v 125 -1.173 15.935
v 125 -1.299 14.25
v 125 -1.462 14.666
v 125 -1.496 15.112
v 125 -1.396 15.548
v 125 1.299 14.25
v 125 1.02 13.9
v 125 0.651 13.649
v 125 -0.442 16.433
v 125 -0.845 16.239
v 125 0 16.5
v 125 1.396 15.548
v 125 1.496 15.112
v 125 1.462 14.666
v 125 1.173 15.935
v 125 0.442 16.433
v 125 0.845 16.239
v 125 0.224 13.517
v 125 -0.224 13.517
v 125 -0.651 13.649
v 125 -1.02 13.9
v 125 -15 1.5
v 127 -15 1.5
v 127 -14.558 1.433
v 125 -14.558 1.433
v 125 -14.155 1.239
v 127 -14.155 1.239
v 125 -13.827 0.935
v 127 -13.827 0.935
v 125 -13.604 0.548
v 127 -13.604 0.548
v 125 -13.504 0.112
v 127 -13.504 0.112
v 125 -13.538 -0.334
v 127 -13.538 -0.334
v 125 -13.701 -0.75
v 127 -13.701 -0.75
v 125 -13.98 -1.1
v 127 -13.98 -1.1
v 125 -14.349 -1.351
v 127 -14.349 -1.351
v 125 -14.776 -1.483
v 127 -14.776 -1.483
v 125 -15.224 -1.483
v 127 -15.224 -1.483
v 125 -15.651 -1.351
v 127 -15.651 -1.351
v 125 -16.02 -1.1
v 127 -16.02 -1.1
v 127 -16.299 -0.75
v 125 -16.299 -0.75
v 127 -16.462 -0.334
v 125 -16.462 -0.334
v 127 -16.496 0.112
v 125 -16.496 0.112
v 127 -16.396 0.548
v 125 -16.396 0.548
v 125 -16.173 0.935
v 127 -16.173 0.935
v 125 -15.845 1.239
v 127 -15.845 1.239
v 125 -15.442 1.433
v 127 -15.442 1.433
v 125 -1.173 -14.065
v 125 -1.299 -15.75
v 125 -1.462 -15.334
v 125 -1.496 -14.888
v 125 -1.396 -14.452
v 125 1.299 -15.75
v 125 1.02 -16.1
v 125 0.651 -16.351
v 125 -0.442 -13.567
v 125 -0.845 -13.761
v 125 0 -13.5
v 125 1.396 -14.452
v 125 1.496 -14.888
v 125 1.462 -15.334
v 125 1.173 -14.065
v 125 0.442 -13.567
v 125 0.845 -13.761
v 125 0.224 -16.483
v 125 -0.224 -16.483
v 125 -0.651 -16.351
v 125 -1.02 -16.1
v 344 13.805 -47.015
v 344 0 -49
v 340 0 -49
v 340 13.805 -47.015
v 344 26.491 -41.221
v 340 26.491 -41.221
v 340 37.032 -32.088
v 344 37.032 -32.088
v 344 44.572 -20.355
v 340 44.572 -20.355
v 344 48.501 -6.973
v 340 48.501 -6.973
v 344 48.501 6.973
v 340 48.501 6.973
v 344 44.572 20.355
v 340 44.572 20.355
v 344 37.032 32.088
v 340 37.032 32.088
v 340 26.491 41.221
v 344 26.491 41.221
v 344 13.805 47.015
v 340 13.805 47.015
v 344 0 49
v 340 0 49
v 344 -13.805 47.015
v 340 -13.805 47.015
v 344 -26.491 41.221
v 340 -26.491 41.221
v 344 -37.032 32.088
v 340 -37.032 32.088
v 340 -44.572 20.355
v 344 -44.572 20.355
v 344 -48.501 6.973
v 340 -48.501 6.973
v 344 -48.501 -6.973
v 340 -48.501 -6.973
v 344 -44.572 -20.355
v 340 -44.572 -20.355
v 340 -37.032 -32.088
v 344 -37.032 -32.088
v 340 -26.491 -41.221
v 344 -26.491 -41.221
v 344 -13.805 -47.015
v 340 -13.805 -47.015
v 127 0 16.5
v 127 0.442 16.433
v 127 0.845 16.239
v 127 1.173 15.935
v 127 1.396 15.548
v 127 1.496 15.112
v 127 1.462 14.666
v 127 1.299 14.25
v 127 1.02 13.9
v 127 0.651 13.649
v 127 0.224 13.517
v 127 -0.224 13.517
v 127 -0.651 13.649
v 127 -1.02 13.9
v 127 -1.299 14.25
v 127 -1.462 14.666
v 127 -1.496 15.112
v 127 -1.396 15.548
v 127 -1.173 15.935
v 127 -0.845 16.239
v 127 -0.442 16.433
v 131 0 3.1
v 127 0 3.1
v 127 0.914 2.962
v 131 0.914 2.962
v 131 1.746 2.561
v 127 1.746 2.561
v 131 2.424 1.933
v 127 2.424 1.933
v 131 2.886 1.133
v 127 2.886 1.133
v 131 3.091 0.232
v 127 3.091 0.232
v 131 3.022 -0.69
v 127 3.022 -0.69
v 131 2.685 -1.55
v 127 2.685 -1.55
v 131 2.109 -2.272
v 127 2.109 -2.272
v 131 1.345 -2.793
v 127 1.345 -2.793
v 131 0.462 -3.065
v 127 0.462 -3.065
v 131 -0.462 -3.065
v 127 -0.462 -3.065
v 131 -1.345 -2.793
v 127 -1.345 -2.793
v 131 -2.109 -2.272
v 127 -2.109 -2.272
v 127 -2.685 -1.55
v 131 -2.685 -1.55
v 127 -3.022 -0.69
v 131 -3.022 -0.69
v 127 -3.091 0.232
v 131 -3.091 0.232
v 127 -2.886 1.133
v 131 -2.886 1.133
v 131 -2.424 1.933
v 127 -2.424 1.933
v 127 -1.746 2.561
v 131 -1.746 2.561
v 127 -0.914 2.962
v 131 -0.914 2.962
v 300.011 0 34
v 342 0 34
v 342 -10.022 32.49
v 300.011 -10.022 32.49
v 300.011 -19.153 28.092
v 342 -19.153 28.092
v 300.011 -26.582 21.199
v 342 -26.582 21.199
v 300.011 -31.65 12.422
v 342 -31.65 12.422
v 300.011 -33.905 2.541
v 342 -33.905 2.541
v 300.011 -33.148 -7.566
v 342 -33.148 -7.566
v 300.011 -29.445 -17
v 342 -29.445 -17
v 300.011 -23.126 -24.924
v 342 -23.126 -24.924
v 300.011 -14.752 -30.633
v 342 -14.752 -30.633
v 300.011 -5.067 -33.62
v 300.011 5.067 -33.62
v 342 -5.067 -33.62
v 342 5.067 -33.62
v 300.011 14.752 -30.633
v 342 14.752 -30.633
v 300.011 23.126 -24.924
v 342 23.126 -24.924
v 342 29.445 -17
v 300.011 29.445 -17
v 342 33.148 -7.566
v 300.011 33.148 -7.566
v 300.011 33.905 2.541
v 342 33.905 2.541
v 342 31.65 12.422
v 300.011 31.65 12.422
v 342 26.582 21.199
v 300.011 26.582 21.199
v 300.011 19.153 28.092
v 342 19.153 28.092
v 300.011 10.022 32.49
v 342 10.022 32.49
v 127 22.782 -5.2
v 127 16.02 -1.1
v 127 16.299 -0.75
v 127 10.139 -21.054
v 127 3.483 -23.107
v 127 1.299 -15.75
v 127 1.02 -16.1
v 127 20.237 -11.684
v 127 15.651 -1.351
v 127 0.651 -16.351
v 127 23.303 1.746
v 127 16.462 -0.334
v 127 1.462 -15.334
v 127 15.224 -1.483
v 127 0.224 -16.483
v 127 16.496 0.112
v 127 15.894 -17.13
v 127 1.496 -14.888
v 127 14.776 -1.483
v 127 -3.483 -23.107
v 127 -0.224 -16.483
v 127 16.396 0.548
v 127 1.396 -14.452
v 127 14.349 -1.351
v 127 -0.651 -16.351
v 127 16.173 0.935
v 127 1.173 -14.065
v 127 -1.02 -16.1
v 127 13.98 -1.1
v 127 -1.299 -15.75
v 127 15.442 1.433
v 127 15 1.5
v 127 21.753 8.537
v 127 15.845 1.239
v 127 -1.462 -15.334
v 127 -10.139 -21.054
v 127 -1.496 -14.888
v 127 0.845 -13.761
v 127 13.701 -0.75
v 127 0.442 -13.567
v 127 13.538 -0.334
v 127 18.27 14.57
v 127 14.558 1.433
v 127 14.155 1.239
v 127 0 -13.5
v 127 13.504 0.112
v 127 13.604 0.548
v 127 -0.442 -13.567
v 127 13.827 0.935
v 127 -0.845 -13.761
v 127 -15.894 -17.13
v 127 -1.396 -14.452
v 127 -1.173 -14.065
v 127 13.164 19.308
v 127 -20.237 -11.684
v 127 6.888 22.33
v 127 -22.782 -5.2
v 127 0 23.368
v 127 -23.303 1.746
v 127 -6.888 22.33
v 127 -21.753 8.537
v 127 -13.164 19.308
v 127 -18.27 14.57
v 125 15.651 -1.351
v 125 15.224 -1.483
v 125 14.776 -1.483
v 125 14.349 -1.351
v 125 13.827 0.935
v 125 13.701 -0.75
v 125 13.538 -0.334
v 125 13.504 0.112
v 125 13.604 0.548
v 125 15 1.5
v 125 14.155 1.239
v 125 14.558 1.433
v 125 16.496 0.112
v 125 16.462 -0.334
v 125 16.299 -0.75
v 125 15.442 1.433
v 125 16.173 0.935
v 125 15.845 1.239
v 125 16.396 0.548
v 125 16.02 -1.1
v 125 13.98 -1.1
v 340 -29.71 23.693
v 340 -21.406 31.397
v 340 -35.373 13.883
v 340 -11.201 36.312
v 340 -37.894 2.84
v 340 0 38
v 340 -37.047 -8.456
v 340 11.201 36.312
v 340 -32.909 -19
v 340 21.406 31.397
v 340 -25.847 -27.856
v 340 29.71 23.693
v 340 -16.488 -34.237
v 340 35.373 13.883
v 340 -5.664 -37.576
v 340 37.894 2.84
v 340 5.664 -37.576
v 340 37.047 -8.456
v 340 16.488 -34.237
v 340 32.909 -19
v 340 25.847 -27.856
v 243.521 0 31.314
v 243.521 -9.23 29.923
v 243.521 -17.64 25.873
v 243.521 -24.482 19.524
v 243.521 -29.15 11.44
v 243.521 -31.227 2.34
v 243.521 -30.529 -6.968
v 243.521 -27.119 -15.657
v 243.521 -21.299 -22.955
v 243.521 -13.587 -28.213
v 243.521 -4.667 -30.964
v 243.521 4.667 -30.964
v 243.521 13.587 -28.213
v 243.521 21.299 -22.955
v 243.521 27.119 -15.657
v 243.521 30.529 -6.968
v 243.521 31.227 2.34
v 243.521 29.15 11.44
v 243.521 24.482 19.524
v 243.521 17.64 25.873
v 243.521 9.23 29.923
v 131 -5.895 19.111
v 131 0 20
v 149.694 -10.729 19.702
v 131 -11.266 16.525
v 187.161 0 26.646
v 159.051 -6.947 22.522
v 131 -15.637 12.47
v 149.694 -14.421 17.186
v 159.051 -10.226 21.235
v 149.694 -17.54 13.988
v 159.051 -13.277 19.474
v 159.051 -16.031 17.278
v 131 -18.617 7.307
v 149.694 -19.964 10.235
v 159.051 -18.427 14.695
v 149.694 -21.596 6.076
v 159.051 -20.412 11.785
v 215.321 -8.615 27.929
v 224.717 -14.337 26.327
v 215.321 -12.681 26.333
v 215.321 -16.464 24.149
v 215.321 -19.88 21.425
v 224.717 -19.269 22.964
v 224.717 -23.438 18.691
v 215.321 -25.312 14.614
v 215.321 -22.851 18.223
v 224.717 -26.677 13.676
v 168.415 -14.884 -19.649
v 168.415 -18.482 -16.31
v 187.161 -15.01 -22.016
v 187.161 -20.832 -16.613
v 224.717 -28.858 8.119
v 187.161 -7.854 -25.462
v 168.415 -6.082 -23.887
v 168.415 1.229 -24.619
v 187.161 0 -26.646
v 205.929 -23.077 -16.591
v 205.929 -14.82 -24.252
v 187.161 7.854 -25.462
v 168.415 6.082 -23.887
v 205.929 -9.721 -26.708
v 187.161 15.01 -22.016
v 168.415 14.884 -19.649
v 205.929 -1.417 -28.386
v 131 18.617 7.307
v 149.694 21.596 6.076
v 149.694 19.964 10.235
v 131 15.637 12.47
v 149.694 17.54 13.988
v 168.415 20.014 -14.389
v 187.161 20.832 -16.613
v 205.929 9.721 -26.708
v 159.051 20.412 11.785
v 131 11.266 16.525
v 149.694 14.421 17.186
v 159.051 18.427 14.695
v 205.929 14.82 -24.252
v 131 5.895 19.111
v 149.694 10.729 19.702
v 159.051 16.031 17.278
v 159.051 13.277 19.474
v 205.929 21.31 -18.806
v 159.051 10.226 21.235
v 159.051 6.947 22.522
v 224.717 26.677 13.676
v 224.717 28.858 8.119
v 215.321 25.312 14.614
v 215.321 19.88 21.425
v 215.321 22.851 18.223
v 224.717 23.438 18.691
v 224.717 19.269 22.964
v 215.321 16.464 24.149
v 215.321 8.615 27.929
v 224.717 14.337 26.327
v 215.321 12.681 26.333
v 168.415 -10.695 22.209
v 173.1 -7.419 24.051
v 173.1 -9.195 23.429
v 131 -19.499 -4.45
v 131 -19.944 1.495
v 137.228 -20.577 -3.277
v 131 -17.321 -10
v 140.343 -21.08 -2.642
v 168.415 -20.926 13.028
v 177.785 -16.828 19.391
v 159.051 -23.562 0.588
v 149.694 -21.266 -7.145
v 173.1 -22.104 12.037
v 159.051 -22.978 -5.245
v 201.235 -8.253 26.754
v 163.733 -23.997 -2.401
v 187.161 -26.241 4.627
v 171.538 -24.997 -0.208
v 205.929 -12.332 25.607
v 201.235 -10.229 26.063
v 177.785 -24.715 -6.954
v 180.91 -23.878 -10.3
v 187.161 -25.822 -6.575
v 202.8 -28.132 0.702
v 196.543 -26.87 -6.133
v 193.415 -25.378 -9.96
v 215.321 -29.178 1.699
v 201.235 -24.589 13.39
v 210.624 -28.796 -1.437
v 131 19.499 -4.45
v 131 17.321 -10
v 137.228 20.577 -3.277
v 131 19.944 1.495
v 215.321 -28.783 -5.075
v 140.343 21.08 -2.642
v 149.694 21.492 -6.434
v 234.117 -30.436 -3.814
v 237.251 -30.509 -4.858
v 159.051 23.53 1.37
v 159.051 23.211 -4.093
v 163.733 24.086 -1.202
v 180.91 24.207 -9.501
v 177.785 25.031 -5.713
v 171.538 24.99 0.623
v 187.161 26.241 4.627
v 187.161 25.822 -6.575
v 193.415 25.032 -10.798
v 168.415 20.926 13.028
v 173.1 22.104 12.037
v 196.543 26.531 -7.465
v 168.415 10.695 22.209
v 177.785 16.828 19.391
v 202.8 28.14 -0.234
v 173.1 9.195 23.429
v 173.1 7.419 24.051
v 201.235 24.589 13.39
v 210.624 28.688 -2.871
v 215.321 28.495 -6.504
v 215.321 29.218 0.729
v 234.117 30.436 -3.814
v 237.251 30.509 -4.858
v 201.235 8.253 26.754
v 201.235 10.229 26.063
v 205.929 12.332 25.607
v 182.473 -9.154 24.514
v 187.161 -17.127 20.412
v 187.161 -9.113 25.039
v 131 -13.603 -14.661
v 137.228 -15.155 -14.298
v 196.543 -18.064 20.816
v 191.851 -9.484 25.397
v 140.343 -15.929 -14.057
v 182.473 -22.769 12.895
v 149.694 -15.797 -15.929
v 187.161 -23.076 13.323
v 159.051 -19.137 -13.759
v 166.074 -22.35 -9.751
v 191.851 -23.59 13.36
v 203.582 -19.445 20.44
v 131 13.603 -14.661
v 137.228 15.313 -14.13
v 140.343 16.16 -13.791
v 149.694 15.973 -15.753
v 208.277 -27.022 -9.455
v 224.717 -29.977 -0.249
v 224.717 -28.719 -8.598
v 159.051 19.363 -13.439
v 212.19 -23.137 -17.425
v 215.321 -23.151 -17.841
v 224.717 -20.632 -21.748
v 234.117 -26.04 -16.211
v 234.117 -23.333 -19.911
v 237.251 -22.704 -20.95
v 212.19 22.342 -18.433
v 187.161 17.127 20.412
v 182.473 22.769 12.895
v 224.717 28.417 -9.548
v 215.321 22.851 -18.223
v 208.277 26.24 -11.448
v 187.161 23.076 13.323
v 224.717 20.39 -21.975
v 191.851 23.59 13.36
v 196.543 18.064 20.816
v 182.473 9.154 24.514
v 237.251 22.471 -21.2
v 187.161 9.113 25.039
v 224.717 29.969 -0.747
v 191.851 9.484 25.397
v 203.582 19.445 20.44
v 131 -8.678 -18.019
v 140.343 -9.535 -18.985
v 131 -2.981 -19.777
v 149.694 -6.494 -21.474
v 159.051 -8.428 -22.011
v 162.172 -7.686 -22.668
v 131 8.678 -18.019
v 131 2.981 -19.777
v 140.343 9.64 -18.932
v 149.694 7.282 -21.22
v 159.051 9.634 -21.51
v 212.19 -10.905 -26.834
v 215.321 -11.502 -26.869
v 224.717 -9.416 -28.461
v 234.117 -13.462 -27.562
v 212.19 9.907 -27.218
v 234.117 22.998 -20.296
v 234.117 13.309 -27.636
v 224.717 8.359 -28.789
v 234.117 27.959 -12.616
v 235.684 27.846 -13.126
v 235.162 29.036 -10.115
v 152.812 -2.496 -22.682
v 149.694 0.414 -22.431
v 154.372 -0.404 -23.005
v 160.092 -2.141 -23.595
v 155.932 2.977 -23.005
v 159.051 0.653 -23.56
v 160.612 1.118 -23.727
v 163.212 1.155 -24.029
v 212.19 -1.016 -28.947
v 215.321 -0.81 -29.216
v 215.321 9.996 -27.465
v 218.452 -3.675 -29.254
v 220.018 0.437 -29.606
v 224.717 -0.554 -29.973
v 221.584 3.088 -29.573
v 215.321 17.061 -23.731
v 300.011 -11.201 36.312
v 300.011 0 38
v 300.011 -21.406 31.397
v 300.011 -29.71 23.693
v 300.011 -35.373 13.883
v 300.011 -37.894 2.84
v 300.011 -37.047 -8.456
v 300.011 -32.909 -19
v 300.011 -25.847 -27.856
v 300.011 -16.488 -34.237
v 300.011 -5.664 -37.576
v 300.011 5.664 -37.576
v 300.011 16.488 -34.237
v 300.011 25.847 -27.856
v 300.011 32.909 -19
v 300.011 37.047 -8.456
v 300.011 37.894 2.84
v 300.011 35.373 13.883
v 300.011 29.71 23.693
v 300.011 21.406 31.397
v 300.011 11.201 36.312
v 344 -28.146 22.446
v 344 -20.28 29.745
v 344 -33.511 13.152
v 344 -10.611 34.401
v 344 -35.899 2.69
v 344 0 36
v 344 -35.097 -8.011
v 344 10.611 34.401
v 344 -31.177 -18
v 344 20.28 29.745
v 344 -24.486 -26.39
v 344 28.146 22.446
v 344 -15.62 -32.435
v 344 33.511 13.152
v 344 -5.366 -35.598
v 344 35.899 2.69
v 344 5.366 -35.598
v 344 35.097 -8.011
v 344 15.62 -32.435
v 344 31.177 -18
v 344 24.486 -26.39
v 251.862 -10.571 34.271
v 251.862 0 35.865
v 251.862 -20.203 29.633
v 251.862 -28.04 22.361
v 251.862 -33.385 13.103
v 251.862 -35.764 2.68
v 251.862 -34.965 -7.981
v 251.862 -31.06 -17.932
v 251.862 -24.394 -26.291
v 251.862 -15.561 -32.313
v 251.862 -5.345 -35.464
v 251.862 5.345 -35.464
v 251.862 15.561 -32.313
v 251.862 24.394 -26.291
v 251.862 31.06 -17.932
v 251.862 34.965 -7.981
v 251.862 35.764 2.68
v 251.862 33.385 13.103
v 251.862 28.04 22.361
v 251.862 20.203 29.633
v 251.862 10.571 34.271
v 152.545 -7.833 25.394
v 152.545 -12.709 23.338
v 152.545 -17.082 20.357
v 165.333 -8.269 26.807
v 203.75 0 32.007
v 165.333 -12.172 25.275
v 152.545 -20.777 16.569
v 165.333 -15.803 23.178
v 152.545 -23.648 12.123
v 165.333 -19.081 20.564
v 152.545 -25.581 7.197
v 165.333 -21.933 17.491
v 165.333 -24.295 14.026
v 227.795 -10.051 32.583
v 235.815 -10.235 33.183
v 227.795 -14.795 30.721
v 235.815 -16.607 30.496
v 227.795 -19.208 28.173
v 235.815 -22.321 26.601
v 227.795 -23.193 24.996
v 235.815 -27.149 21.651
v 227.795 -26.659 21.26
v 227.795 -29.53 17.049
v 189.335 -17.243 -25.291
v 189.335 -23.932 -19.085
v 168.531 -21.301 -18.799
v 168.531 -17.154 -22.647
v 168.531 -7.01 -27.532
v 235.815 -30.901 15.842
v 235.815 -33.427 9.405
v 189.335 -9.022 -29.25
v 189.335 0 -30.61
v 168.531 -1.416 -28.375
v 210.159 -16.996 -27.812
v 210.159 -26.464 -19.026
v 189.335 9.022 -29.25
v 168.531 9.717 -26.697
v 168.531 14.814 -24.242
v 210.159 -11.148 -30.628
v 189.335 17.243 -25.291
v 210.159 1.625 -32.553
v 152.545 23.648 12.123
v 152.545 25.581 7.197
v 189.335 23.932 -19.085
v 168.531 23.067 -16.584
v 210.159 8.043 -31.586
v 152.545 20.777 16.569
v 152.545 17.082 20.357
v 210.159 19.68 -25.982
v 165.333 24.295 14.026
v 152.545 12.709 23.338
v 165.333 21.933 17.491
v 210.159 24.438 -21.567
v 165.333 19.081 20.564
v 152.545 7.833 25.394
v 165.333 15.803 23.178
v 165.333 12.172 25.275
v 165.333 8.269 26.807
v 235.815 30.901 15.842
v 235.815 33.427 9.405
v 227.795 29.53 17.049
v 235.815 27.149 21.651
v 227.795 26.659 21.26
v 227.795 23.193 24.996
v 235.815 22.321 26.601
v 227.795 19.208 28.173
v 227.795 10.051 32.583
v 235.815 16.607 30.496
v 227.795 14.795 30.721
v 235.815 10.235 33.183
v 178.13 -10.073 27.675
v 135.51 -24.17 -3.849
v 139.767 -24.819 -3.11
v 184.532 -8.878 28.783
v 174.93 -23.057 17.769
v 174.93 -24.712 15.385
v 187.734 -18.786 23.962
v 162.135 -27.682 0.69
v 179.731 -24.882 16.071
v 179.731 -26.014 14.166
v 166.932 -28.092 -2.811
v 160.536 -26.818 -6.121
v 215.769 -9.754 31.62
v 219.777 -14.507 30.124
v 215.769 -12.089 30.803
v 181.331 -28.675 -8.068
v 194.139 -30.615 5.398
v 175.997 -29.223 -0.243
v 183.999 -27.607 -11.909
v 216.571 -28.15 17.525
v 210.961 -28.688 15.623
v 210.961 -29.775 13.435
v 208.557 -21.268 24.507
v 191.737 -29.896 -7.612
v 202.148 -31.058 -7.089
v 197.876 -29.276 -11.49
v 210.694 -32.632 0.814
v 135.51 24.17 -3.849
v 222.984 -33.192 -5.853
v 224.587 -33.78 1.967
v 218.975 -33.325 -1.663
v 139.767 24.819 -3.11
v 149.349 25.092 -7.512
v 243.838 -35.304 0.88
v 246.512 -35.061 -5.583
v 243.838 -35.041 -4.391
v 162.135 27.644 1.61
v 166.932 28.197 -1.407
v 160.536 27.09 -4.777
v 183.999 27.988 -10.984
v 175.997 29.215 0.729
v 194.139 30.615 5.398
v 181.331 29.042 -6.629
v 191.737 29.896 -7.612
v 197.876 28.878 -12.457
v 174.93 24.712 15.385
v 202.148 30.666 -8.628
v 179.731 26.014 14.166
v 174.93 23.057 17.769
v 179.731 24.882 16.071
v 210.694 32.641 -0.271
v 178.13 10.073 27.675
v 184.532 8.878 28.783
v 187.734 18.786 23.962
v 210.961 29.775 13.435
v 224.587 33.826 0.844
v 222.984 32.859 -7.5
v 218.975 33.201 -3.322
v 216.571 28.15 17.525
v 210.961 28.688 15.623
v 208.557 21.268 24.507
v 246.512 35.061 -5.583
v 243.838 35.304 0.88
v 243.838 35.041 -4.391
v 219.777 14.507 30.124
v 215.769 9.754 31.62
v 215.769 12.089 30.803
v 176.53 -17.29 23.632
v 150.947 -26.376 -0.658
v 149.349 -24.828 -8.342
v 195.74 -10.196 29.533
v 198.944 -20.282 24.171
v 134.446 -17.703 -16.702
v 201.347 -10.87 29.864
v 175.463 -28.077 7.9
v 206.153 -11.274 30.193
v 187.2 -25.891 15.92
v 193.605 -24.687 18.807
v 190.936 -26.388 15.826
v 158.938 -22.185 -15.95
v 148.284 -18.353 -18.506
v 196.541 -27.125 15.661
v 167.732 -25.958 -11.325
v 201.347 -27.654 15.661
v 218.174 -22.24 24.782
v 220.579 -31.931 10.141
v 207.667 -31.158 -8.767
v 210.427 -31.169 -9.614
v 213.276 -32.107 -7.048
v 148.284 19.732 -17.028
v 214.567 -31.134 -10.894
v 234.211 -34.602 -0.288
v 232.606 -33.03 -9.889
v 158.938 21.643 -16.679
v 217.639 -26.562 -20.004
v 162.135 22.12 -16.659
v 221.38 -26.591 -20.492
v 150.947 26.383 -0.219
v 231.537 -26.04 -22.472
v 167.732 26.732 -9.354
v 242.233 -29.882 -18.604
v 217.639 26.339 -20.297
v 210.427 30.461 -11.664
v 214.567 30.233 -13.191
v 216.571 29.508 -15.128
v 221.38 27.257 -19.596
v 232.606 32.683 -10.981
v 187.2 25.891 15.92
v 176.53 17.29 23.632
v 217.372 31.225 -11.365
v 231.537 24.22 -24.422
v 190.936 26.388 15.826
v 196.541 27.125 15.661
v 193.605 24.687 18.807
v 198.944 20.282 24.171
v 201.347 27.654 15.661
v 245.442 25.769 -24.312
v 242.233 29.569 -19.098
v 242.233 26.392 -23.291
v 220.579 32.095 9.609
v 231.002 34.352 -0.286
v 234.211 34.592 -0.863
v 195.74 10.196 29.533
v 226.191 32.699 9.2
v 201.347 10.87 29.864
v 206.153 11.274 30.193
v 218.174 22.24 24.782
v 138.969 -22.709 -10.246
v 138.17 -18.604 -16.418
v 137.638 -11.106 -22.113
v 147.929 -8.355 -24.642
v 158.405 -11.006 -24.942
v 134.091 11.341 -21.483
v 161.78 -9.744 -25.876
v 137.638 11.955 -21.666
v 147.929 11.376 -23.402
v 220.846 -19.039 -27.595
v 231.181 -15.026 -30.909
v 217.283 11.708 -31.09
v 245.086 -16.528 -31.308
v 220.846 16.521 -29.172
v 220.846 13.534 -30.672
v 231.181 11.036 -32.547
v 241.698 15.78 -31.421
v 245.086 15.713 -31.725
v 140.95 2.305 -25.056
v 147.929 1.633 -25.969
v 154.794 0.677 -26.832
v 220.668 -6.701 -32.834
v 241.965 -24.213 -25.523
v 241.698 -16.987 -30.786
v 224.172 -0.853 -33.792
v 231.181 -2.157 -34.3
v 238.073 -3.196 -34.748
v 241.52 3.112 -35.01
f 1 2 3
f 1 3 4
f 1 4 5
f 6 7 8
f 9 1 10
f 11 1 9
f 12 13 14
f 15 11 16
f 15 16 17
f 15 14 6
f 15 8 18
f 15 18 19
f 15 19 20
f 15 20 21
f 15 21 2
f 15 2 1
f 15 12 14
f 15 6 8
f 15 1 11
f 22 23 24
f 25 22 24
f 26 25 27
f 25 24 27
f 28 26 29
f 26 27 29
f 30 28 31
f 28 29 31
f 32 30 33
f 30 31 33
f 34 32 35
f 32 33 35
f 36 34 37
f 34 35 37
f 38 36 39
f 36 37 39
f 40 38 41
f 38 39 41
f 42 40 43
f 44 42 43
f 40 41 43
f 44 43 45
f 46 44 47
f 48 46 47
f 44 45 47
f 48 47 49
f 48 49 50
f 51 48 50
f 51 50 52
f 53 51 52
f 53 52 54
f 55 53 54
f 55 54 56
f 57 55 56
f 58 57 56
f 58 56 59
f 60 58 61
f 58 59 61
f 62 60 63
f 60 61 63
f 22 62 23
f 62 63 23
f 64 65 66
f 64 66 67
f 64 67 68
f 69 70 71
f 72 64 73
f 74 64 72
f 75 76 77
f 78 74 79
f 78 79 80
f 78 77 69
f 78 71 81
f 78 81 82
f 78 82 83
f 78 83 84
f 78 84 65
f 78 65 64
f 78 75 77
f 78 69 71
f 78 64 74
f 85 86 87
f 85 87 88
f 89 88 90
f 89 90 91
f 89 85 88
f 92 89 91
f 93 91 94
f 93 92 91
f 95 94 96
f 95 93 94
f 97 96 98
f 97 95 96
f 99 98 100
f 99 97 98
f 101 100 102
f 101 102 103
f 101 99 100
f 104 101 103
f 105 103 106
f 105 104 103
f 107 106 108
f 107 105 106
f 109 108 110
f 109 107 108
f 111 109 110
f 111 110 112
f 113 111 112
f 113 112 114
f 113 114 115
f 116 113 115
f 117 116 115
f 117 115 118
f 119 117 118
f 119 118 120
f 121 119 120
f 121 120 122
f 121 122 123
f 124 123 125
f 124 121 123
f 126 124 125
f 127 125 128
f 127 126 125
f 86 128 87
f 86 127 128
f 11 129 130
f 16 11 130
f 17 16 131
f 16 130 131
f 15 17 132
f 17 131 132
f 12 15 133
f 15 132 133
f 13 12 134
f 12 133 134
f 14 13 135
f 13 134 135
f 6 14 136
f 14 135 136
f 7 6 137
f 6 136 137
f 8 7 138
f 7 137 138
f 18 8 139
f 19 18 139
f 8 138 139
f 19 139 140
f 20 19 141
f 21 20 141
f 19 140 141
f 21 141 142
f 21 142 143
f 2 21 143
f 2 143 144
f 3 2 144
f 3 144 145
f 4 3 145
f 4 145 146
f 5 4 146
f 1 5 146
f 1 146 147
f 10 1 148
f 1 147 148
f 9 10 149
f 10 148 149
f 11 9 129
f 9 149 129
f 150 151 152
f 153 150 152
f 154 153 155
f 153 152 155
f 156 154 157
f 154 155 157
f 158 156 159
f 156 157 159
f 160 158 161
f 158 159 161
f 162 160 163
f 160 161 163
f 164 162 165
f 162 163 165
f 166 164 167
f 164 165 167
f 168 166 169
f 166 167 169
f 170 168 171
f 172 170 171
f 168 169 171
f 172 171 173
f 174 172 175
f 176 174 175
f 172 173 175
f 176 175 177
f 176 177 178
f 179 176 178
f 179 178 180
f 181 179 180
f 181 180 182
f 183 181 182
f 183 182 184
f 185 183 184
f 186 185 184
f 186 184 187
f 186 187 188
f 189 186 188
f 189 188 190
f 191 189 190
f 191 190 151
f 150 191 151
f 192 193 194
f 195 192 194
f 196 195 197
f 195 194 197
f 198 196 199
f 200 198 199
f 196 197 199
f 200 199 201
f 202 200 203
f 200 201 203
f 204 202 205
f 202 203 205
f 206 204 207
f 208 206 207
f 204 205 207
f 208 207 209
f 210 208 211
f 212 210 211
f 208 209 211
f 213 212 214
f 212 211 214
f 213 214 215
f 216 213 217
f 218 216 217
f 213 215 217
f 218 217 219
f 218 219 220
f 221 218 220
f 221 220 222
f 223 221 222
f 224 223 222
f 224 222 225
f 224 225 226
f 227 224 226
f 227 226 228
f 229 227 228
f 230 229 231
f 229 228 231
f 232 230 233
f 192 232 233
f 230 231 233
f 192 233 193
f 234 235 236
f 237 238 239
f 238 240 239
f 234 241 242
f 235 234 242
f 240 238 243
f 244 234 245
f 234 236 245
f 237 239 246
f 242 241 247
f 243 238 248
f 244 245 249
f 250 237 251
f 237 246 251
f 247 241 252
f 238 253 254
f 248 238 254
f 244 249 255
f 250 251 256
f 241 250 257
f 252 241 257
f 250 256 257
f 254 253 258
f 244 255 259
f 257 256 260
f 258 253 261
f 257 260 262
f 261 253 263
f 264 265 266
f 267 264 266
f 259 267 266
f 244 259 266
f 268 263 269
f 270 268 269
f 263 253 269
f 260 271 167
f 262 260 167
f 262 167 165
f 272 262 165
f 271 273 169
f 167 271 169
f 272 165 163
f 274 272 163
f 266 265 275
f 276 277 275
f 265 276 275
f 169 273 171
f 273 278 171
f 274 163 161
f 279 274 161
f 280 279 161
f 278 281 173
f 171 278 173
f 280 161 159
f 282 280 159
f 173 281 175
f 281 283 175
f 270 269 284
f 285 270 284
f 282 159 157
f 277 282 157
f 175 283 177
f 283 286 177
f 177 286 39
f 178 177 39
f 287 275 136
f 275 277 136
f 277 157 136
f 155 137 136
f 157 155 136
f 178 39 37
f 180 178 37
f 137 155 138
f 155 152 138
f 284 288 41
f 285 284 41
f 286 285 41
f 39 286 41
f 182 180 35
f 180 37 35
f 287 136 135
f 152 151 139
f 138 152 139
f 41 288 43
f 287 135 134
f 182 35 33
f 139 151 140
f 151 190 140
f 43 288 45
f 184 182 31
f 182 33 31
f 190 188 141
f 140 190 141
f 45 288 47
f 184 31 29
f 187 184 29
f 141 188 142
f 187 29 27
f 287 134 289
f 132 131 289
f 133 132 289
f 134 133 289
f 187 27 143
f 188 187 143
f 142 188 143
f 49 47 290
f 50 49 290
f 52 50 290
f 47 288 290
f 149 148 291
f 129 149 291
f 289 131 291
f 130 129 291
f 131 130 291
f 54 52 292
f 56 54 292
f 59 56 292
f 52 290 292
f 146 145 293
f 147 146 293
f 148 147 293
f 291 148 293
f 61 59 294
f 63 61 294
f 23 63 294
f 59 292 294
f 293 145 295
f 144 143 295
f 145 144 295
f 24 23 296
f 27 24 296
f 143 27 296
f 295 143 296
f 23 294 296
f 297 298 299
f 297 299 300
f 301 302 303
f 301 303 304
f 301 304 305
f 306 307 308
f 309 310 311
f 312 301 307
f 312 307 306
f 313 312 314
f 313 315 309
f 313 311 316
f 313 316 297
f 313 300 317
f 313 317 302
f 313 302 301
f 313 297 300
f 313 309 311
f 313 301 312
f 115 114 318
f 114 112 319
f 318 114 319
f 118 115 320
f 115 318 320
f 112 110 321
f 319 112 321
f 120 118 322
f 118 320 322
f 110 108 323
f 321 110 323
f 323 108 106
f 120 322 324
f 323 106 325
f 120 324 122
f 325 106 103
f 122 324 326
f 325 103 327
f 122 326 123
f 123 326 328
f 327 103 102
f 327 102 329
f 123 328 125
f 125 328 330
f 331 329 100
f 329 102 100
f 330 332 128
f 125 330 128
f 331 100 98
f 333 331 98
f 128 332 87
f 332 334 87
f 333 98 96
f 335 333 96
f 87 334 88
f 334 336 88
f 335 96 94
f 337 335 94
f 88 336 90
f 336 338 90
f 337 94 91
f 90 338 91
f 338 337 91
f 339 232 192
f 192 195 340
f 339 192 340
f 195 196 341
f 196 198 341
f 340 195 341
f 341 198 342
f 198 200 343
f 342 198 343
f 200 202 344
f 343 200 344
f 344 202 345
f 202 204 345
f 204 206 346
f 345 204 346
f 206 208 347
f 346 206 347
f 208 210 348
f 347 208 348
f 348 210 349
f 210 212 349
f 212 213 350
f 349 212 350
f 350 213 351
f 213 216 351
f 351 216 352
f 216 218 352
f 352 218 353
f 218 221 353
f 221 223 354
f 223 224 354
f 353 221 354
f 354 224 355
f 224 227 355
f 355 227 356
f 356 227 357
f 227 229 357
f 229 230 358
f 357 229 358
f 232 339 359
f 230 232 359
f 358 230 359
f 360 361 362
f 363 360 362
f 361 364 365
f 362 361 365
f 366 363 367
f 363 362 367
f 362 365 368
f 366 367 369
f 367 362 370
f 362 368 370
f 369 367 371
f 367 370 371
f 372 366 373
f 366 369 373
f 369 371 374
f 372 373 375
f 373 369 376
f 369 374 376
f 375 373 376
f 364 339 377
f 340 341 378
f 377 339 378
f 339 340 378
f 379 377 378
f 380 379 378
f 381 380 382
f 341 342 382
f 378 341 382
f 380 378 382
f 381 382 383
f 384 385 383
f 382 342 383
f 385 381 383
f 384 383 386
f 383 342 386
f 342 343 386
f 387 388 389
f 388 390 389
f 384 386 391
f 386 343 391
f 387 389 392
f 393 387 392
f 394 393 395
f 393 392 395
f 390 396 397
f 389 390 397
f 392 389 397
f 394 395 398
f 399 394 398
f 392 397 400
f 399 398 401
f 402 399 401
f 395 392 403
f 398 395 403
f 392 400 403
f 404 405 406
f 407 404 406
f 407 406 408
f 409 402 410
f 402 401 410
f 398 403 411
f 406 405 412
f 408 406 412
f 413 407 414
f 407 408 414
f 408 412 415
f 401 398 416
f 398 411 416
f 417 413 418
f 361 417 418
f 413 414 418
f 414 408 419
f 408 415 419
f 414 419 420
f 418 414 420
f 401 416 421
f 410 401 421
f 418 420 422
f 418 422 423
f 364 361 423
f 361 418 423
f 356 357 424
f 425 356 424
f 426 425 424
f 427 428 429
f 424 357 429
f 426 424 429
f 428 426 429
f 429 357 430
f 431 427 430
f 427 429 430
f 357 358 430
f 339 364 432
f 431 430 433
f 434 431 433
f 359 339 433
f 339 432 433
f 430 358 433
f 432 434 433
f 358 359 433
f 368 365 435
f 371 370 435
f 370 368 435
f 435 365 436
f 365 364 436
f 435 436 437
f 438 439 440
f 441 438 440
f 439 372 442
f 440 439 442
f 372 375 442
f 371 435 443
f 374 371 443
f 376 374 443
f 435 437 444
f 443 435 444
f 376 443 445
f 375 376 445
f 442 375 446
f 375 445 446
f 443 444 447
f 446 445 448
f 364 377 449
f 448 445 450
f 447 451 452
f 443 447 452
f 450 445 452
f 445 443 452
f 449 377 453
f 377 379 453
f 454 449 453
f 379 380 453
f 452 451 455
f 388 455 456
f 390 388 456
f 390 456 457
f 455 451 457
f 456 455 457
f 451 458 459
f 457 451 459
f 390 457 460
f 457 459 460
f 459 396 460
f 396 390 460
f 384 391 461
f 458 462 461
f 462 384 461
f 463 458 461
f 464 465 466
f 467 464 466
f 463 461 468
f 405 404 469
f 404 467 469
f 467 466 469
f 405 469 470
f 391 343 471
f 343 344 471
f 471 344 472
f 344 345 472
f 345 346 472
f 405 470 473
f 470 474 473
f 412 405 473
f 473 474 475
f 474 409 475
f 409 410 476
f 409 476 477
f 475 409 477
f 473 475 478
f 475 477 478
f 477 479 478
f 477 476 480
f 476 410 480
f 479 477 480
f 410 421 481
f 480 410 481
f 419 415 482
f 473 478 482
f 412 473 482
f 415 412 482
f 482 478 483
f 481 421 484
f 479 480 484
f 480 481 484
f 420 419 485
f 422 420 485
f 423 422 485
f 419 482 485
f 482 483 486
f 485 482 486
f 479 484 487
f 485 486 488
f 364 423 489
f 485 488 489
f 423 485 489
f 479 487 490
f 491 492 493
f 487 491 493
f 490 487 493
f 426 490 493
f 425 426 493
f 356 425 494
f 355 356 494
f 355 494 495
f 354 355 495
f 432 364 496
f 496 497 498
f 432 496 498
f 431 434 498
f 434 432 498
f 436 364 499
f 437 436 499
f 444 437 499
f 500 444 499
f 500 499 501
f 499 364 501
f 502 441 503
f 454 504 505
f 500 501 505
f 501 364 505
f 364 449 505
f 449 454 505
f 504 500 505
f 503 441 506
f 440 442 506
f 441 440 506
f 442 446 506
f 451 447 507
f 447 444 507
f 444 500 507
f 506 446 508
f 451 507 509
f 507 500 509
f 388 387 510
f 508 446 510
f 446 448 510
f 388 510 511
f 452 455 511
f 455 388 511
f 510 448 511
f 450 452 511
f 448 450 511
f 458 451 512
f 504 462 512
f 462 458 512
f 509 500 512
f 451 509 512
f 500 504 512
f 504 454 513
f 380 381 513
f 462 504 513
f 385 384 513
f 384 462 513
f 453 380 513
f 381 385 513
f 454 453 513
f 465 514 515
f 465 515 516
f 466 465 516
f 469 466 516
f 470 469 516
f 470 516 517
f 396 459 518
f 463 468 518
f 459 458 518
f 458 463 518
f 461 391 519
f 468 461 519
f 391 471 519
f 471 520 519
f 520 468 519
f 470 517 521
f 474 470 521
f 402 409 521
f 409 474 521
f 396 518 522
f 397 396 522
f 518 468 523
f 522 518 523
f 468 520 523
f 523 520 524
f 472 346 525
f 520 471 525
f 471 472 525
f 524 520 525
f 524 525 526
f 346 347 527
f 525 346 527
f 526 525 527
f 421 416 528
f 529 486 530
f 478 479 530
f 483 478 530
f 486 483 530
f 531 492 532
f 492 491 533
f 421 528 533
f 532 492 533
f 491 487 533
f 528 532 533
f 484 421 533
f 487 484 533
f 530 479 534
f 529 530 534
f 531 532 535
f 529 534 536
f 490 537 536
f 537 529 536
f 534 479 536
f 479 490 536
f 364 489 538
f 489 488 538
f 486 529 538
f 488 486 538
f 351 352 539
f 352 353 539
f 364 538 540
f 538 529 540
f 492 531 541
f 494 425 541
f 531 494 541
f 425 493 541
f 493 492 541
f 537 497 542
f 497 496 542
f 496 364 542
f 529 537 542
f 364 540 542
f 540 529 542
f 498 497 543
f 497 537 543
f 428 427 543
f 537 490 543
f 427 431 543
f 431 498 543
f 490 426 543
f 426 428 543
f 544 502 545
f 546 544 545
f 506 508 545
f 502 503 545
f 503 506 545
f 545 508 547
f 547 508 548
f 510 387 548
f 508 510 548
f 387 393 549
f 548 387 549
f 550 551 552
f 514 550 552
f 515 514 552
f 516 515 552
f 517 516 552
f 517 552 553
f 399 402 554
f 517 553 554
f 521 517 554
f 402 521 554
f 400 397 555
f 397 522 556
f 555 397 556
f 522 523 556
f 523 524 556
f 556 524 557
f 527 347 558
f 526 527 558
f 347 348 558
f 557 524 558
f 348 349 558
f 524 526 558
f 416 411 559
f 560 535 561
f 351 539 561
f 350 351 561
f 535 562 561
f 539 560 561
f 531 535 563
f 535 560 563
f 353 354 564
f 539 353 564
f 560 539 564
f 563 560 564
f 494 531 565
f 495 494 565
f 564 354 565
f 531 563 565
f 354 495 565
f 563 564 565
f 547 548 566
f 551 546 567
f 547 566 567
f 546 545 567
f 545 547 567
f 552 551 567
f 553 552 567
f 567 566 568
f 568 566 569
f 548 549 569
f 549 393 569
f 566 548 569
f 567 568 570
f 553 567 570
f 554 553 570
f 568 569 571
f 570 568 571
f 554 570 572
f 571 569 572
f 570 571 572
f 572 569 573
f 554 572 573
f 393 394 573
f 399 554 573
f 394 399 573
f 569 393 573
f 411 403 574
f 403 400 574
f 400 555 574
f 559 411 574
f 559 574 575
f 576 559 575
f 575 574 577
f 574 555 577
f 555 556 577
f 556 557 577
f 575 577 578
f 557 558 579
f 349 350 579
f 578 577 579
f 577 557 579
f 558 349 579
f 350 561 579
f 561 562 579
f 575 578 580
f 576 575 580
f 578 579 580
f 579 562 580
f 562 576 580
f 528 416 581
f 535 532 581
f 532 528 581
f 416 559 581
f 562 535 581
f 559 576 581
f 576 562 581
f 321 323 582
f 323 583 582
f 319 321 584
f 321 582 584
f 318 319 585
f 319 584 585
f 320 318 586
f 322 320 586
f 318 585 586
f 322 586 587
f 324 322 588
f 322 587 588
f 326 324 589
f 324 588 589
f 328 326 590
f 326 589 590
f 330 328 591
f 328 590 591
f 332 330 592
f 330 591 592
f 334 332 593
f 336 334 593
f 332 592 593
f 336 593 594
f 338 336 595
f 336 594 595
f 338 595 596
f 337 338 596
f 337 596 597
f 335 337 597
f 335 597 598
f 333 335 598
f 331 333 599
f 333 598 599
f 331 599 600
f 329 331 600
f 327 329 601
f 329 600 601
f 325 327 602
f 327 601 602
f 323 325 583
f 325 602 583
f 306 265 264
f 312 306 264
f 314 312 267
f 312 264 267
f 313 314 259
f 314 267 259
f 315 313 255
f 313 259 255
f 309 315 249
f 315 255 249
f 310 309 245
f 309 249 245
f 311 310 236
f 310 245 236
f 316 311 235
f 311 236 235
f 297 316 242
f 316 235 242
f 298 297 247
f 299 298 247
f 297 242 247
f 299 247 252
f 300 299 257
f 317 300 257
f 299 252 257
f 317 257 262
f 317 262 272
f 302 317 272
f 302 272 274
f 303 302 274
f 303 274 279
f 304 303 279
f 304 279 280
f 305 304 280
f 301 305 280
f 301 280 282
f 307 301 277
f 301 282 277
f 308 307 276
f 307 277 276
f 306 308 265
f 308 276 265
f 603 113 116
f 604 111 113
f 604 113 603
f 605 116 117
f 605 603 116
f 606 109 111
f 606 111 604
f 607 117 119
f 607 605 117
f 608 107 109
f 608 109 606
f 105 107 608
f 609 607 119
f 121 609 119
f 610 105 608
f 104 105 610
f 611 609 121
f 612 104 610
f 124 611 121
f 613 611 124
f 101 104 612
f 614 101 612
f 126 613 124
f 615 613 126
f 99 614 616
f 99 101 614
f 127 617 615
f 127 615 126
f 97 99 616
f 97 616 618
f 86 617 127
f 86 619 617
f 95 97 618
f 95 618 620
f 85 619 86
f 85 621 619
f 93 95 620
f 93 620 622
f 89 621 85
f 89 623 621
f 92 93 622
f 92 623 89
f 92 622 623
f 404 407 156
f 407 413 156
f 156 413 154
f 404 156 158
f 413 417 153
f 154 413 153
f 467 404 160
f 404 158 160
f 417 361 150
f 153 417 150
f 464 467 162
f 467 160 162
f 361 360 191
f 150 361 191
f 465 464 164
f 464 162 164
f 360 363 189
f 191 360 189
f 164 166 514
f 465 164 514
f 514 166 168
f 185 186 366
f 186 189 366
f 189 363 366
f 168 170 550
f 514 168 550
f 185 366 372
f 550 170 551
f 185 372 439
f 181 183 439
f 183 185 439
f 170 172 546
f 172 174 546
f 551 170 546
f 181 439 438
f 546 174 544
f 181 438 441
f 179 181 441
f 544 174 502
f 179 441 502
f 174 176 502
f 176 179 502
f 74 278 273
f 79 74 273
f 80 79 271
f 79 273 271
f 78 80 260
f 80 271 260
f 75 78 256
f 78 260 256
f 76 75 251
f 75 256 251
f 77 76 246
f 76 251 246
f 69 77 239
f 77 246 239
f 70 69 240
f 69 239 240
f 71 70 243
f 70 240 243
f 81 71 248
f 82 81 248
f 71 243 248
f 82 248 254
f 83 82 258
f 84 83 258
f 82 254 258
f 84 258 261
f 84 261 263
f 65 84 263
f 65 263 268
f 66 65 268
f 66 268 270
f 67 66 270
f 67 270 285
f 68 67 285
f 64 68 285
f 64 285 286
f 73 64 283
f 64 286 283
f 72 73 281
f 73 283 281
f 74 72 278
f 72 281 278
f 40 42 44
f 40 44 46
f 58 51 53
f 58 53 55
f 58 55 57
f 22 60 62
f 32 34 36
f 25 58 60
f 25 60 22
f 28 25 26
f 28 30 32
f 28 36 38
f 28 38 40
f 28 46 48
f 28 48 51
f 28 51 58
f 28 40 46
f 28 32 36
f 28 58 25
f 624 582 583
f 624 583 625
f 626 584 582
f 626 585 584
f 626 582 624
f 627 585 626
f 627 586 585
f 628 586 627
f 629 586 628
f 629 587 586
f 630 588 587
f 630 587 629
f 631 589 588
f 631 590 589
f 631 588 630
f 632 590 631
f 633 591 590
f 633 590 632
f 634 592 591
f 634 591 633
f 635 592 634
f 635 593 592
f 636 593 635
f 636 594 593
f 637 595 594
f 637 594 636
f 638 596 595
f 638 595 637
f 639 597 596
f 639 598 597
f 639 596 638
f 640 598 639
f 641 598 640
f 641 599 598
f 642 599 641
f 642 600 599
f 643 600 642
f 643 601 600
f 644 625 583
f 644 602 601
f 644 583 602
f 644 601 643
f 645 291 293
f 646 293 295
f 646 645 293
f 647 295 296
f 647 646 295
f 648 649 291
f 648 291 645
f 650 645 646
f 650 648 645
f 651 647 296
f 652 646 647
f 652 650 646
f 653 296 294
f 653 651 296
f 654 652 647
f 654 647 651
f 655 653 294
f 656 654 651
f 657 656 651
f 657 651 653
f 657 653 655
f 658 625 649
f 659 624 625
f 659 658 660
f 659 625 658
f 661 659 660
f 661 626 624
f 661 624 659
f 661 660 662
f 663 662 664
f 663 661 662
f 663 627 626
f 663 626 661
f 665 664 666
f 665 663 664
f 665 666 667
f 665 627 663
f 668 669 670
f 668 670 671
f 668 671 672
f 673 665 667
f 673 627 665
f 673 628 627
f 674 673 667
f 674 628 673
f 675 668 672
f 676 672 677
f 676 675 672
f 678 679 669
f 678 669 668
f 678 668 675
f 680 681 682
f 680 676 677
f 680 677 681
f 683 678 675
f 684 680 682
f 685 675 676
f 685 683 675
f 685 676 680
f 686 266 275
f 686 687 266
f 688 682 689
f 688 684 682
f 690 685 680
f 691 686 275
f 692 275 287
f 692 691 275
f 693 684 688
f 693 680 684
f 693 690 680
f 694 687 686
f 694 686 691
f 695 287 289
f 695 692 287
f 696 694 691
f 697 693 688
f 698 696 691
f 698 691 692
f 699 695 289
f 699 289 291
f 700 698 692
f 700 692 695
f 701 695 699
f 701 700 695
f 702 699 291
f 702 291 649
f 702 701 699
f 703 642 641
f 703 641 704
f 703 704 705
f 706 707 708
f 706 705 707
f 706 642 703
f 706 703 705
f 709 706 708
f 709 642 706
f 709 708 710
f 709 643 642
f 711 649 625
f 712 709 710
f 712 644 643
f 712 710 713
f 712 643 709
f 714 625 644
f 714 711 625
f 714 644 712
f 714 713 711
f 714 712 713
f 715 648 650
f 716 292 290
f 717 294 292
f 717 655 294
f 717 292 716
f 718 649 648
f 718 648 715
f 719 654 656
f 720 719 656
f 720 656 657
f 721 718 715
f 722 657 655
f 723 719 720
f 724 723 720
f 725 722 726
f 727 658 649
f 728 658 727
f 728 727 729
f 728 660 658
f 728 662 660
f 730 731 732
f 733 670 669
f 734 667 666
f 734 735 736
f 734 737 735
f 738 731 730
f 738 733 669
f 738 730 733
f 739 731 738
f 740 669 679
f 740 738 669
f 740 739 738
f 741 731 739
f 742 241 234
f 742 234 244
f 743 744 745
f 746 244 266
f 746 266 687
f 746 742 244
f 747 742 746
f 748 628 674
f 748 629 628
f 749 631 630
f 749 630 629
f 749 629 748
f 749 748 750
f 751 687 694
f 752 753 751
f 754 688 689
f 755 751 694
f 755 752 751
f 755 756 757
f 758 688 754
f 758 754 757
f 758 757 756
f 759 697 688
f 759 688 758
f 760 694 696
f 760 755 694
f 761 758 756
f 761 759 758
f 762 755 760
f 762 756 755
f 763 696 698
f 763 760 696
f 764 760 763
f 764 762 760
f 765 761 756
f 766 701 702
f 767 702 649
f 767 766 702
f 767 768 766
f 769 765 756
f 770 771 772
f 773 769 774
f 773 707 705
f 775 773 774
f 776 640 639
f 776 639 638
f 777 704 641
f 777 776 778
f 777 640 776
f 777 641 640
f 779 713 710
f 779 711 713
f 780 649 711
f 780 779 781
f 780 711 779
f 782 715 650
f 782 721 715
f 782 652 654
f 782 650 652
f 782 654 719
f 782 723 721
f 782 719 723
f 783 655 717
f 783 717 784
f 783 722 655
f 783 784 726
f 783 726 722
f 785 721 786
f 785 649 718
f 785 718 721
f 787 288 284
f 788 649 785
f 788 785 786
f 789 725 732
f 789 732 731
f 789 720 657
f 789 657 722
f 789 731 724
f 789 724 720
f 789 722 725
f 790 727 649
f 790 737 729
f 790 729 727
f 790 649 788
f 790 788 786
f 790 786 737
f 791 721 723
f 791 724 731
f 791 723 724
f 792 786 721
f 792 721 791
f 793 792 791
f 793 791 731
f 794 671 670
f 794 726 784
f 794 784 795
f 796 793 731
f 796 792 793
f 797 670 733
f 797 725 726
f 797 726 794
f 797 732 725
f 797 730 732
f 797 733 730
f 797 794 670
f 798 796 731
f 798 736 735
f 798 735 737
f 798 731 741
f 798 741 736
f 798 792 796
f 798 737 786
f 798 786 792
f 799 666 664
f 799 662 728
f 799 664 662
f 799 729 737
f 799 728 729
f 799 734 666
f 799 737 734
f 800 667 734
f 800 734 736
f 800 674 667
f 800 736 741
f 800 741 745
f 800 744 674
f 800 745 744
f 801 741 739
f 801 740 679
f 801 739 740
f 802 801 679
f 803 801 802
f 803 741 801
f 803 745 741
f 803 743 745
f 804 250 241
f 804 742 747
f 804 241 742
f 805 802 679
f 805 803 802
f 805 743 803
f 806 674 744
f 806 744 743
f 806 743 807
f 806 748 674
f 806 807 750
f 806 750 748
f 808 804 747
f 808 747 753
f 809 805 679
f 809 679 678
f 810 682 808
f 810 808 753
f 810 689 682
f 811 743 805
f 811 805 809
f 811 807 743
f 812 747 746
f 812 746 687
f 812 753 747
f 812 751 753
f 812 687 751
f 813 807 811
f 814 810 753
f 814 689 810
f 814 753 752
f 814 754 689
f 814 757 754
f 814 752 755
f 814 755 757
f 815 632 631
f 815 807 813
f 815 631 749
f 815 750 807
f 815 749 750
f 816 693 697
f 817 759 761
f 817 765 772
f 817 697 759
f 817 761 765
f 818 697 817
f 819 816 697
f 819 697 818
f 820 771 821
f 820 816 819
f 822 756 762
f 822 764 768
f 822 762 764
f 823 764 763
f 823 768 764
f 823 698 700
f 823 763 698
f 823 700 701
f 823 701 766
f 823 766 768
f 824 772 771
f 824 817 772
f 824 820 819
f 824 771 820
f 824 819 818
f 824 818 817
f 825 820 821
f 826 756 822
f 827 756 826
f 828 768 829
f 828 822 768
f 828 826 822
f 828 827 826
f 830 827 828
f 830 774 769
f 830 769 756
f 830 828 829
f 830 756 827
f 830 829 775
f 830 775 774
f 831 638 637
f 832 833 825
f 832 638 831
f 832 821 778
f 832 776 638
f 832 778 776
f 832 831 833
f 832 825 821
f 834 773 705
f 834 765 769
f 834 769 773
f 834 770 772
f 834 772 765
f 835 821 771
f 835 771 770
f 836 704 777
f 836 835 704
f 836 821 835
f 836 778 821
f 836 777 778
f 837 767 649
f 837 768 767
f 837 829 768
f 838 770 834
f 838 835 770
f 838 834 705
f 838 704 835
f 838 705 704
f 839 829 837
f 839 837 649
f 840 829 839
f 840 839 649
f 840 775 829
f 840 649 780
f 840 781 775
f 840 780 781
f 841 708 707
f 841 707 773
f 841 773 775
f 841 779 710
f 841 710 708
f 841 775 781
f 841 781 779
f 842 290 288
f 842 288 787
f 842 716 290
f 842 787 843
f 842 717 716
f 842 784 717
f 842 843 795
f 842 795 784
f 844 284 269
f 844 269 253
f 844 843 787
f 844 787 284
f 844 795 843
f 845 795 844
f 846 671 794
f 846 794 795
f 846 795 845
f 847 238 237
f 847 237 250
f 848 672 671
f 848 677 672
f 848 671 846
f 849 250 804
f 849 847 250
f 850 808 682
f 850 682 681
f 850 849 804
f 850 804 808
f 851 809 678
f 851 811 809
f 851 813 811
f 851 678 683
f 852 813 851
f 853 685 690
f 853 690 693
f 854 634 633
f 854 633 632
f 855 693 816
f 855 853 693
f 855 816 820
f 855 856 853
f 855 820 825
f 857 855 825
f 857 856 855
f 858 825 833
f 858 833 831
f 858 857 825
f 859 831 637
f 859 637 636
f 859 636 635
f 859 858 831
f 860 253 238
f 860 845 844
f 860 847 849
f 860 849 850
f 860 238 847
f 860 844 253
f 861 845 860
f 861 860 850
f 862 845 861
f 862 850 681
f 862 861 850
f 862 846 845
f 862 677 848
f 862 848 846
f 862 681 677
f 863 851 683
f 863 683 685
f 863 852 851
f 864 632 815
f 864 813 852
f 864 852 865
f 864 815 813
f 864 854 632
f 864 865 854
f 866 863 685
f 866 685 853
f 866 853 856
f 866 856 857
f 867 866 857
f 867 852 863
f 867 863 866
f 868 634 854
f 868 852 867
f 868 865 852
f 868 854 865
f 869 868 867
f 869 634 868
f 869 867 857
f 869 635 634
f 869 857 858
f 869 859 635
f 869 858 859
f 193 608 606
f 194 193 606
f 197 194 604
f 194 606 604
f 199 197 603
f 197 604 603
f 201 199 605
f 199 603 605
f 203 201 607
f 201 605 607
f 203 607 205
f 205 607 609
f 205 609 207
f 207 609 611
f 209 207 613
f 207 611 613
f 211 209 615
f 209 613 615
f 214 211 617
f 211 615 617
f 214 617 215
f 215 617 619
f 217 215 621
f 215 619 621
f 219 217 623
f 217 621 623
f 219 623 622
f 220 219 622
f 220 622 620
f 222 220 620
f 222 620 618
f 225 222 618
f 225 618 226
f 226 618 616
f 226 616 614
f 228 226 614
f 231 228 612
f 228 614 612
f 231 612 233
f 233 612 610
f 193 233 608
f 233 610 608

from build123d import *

# Parameters (mm, degrees)
SKETCH3_R           = 3.1
CUT_EXTRUDE1_DEPTH  = 222.614539842
BOSS_EXTRUDE1_START = 4
SKETCH4_R           = 49.000027987
SKETCH4_R_2         = 34.000027987
BOSS_EXTRUDE1_DEPTH = 4
CHAMFER1_SIZE       = 2
SKETCH5_R           = 1.5
BOSS_EXTRUDE2_DEPTH = 2


with BuildPart() as part:
    # Sketch2 → Revolve1 (revolve)
    with BuildSketch(Plane.XY, mode=Mode.PRIVATE) as revolve1_sk:
        with BuildLine():
            Line((340, 38.000027987), (300.010580524, 38.000027987))
            add(Edge.make_bspline(
                [(127, 23.368217816), (127.144658905, 23.387357923), (141.067067172, 25.227802685), (169.534203287, 28.668411554), (205.200950651, 32.237503735), (234.354838071, 34.660219308), (256.239727532, 36.200460456), (274.483617298, 37.216214614), (289.091810146, 37.788845449), (296.367863688, 37.980756791), (300.010580524, 38.000027987)],
                knots=[0.426924824, 0.426924824, 0.426924824, 0.426924824, 0.428368468, 0.565862687, 0.710575124, 0.782931343, 0.855287562, 0.927643781, 0.963821891, 1, 1, 1, 1], degree=3))
            Line((127, 23.368217816), (127, 0))
            Line((127, 0), (131, 0))
            Line((131, 0), (131, 20))
            ThreePointArc((131, 20), (215.320786735, 29.227370129), (300.010580524, 34.000027987))
            Line((300.010580524, 34.000027987), (340, 34.000027987))
            Line((340, 34.000027987), (340, 38.000027987))
        make_face()
    revolve(revolve1_sk.sketch.rotate(Axis((0, 0, 0), (1, 0, 0)), 90), axis=Axis((0, 0, 0), (1, 0, 0)))

    # Sketch3 → Cut-Extrude1 (cut, through all)
    with BuildSketch(Plane.ZY.offset(-125)):
        Circle(SKETCH3_R)
    extrude(amount=-CUT_EXTRUDE1_DEPTH, mode=Mode.SUBTRACT)

    # Sketch4 → Boss-Extrude1 (add)
    with BuildSketch(Plane(origin=(340, 0, 0), x_dir=(0, 0, -1), z_dir=(1, 0, 0)).offset(BOSS_EXTRUDE1_START)):
        Circle(SKETCH4_R)
        with Locations(Location((0, 0, 0), (0, 0, 180))):
            Circle(SKETCH4_R_2, mode=Mode.SUBTRACT)
    extrude(amount=-BOSS_EXTRUDE1_DEPTH)

    # Chamfer1
    chamfer1_edges = [part.edges().sort_by_distance(p)[0] for p in [
        (344, 0, -34.000027987),
    ]]
    chamfer(chamfer1_edges, length=CHAMFER1_SIZE)

    # Sketch5 → Boss-Extrude2 (add)
    with BuildSketch(Plane.ZY.offset(-127)):
        with Locations((0, 15)):
            Circle(SKETCH5_R)
        with Locations((15, 0)):
            Circle(SKETCH5_R)
        with Locations((-15, 0)):
            Circle(SKETCH5_R)
        with Locations((0, -15)):
            Circle(SKETCH5_R)
    extrude(amount=BOSS_EXTRUDE2_DEPTH)


solid = part.part
